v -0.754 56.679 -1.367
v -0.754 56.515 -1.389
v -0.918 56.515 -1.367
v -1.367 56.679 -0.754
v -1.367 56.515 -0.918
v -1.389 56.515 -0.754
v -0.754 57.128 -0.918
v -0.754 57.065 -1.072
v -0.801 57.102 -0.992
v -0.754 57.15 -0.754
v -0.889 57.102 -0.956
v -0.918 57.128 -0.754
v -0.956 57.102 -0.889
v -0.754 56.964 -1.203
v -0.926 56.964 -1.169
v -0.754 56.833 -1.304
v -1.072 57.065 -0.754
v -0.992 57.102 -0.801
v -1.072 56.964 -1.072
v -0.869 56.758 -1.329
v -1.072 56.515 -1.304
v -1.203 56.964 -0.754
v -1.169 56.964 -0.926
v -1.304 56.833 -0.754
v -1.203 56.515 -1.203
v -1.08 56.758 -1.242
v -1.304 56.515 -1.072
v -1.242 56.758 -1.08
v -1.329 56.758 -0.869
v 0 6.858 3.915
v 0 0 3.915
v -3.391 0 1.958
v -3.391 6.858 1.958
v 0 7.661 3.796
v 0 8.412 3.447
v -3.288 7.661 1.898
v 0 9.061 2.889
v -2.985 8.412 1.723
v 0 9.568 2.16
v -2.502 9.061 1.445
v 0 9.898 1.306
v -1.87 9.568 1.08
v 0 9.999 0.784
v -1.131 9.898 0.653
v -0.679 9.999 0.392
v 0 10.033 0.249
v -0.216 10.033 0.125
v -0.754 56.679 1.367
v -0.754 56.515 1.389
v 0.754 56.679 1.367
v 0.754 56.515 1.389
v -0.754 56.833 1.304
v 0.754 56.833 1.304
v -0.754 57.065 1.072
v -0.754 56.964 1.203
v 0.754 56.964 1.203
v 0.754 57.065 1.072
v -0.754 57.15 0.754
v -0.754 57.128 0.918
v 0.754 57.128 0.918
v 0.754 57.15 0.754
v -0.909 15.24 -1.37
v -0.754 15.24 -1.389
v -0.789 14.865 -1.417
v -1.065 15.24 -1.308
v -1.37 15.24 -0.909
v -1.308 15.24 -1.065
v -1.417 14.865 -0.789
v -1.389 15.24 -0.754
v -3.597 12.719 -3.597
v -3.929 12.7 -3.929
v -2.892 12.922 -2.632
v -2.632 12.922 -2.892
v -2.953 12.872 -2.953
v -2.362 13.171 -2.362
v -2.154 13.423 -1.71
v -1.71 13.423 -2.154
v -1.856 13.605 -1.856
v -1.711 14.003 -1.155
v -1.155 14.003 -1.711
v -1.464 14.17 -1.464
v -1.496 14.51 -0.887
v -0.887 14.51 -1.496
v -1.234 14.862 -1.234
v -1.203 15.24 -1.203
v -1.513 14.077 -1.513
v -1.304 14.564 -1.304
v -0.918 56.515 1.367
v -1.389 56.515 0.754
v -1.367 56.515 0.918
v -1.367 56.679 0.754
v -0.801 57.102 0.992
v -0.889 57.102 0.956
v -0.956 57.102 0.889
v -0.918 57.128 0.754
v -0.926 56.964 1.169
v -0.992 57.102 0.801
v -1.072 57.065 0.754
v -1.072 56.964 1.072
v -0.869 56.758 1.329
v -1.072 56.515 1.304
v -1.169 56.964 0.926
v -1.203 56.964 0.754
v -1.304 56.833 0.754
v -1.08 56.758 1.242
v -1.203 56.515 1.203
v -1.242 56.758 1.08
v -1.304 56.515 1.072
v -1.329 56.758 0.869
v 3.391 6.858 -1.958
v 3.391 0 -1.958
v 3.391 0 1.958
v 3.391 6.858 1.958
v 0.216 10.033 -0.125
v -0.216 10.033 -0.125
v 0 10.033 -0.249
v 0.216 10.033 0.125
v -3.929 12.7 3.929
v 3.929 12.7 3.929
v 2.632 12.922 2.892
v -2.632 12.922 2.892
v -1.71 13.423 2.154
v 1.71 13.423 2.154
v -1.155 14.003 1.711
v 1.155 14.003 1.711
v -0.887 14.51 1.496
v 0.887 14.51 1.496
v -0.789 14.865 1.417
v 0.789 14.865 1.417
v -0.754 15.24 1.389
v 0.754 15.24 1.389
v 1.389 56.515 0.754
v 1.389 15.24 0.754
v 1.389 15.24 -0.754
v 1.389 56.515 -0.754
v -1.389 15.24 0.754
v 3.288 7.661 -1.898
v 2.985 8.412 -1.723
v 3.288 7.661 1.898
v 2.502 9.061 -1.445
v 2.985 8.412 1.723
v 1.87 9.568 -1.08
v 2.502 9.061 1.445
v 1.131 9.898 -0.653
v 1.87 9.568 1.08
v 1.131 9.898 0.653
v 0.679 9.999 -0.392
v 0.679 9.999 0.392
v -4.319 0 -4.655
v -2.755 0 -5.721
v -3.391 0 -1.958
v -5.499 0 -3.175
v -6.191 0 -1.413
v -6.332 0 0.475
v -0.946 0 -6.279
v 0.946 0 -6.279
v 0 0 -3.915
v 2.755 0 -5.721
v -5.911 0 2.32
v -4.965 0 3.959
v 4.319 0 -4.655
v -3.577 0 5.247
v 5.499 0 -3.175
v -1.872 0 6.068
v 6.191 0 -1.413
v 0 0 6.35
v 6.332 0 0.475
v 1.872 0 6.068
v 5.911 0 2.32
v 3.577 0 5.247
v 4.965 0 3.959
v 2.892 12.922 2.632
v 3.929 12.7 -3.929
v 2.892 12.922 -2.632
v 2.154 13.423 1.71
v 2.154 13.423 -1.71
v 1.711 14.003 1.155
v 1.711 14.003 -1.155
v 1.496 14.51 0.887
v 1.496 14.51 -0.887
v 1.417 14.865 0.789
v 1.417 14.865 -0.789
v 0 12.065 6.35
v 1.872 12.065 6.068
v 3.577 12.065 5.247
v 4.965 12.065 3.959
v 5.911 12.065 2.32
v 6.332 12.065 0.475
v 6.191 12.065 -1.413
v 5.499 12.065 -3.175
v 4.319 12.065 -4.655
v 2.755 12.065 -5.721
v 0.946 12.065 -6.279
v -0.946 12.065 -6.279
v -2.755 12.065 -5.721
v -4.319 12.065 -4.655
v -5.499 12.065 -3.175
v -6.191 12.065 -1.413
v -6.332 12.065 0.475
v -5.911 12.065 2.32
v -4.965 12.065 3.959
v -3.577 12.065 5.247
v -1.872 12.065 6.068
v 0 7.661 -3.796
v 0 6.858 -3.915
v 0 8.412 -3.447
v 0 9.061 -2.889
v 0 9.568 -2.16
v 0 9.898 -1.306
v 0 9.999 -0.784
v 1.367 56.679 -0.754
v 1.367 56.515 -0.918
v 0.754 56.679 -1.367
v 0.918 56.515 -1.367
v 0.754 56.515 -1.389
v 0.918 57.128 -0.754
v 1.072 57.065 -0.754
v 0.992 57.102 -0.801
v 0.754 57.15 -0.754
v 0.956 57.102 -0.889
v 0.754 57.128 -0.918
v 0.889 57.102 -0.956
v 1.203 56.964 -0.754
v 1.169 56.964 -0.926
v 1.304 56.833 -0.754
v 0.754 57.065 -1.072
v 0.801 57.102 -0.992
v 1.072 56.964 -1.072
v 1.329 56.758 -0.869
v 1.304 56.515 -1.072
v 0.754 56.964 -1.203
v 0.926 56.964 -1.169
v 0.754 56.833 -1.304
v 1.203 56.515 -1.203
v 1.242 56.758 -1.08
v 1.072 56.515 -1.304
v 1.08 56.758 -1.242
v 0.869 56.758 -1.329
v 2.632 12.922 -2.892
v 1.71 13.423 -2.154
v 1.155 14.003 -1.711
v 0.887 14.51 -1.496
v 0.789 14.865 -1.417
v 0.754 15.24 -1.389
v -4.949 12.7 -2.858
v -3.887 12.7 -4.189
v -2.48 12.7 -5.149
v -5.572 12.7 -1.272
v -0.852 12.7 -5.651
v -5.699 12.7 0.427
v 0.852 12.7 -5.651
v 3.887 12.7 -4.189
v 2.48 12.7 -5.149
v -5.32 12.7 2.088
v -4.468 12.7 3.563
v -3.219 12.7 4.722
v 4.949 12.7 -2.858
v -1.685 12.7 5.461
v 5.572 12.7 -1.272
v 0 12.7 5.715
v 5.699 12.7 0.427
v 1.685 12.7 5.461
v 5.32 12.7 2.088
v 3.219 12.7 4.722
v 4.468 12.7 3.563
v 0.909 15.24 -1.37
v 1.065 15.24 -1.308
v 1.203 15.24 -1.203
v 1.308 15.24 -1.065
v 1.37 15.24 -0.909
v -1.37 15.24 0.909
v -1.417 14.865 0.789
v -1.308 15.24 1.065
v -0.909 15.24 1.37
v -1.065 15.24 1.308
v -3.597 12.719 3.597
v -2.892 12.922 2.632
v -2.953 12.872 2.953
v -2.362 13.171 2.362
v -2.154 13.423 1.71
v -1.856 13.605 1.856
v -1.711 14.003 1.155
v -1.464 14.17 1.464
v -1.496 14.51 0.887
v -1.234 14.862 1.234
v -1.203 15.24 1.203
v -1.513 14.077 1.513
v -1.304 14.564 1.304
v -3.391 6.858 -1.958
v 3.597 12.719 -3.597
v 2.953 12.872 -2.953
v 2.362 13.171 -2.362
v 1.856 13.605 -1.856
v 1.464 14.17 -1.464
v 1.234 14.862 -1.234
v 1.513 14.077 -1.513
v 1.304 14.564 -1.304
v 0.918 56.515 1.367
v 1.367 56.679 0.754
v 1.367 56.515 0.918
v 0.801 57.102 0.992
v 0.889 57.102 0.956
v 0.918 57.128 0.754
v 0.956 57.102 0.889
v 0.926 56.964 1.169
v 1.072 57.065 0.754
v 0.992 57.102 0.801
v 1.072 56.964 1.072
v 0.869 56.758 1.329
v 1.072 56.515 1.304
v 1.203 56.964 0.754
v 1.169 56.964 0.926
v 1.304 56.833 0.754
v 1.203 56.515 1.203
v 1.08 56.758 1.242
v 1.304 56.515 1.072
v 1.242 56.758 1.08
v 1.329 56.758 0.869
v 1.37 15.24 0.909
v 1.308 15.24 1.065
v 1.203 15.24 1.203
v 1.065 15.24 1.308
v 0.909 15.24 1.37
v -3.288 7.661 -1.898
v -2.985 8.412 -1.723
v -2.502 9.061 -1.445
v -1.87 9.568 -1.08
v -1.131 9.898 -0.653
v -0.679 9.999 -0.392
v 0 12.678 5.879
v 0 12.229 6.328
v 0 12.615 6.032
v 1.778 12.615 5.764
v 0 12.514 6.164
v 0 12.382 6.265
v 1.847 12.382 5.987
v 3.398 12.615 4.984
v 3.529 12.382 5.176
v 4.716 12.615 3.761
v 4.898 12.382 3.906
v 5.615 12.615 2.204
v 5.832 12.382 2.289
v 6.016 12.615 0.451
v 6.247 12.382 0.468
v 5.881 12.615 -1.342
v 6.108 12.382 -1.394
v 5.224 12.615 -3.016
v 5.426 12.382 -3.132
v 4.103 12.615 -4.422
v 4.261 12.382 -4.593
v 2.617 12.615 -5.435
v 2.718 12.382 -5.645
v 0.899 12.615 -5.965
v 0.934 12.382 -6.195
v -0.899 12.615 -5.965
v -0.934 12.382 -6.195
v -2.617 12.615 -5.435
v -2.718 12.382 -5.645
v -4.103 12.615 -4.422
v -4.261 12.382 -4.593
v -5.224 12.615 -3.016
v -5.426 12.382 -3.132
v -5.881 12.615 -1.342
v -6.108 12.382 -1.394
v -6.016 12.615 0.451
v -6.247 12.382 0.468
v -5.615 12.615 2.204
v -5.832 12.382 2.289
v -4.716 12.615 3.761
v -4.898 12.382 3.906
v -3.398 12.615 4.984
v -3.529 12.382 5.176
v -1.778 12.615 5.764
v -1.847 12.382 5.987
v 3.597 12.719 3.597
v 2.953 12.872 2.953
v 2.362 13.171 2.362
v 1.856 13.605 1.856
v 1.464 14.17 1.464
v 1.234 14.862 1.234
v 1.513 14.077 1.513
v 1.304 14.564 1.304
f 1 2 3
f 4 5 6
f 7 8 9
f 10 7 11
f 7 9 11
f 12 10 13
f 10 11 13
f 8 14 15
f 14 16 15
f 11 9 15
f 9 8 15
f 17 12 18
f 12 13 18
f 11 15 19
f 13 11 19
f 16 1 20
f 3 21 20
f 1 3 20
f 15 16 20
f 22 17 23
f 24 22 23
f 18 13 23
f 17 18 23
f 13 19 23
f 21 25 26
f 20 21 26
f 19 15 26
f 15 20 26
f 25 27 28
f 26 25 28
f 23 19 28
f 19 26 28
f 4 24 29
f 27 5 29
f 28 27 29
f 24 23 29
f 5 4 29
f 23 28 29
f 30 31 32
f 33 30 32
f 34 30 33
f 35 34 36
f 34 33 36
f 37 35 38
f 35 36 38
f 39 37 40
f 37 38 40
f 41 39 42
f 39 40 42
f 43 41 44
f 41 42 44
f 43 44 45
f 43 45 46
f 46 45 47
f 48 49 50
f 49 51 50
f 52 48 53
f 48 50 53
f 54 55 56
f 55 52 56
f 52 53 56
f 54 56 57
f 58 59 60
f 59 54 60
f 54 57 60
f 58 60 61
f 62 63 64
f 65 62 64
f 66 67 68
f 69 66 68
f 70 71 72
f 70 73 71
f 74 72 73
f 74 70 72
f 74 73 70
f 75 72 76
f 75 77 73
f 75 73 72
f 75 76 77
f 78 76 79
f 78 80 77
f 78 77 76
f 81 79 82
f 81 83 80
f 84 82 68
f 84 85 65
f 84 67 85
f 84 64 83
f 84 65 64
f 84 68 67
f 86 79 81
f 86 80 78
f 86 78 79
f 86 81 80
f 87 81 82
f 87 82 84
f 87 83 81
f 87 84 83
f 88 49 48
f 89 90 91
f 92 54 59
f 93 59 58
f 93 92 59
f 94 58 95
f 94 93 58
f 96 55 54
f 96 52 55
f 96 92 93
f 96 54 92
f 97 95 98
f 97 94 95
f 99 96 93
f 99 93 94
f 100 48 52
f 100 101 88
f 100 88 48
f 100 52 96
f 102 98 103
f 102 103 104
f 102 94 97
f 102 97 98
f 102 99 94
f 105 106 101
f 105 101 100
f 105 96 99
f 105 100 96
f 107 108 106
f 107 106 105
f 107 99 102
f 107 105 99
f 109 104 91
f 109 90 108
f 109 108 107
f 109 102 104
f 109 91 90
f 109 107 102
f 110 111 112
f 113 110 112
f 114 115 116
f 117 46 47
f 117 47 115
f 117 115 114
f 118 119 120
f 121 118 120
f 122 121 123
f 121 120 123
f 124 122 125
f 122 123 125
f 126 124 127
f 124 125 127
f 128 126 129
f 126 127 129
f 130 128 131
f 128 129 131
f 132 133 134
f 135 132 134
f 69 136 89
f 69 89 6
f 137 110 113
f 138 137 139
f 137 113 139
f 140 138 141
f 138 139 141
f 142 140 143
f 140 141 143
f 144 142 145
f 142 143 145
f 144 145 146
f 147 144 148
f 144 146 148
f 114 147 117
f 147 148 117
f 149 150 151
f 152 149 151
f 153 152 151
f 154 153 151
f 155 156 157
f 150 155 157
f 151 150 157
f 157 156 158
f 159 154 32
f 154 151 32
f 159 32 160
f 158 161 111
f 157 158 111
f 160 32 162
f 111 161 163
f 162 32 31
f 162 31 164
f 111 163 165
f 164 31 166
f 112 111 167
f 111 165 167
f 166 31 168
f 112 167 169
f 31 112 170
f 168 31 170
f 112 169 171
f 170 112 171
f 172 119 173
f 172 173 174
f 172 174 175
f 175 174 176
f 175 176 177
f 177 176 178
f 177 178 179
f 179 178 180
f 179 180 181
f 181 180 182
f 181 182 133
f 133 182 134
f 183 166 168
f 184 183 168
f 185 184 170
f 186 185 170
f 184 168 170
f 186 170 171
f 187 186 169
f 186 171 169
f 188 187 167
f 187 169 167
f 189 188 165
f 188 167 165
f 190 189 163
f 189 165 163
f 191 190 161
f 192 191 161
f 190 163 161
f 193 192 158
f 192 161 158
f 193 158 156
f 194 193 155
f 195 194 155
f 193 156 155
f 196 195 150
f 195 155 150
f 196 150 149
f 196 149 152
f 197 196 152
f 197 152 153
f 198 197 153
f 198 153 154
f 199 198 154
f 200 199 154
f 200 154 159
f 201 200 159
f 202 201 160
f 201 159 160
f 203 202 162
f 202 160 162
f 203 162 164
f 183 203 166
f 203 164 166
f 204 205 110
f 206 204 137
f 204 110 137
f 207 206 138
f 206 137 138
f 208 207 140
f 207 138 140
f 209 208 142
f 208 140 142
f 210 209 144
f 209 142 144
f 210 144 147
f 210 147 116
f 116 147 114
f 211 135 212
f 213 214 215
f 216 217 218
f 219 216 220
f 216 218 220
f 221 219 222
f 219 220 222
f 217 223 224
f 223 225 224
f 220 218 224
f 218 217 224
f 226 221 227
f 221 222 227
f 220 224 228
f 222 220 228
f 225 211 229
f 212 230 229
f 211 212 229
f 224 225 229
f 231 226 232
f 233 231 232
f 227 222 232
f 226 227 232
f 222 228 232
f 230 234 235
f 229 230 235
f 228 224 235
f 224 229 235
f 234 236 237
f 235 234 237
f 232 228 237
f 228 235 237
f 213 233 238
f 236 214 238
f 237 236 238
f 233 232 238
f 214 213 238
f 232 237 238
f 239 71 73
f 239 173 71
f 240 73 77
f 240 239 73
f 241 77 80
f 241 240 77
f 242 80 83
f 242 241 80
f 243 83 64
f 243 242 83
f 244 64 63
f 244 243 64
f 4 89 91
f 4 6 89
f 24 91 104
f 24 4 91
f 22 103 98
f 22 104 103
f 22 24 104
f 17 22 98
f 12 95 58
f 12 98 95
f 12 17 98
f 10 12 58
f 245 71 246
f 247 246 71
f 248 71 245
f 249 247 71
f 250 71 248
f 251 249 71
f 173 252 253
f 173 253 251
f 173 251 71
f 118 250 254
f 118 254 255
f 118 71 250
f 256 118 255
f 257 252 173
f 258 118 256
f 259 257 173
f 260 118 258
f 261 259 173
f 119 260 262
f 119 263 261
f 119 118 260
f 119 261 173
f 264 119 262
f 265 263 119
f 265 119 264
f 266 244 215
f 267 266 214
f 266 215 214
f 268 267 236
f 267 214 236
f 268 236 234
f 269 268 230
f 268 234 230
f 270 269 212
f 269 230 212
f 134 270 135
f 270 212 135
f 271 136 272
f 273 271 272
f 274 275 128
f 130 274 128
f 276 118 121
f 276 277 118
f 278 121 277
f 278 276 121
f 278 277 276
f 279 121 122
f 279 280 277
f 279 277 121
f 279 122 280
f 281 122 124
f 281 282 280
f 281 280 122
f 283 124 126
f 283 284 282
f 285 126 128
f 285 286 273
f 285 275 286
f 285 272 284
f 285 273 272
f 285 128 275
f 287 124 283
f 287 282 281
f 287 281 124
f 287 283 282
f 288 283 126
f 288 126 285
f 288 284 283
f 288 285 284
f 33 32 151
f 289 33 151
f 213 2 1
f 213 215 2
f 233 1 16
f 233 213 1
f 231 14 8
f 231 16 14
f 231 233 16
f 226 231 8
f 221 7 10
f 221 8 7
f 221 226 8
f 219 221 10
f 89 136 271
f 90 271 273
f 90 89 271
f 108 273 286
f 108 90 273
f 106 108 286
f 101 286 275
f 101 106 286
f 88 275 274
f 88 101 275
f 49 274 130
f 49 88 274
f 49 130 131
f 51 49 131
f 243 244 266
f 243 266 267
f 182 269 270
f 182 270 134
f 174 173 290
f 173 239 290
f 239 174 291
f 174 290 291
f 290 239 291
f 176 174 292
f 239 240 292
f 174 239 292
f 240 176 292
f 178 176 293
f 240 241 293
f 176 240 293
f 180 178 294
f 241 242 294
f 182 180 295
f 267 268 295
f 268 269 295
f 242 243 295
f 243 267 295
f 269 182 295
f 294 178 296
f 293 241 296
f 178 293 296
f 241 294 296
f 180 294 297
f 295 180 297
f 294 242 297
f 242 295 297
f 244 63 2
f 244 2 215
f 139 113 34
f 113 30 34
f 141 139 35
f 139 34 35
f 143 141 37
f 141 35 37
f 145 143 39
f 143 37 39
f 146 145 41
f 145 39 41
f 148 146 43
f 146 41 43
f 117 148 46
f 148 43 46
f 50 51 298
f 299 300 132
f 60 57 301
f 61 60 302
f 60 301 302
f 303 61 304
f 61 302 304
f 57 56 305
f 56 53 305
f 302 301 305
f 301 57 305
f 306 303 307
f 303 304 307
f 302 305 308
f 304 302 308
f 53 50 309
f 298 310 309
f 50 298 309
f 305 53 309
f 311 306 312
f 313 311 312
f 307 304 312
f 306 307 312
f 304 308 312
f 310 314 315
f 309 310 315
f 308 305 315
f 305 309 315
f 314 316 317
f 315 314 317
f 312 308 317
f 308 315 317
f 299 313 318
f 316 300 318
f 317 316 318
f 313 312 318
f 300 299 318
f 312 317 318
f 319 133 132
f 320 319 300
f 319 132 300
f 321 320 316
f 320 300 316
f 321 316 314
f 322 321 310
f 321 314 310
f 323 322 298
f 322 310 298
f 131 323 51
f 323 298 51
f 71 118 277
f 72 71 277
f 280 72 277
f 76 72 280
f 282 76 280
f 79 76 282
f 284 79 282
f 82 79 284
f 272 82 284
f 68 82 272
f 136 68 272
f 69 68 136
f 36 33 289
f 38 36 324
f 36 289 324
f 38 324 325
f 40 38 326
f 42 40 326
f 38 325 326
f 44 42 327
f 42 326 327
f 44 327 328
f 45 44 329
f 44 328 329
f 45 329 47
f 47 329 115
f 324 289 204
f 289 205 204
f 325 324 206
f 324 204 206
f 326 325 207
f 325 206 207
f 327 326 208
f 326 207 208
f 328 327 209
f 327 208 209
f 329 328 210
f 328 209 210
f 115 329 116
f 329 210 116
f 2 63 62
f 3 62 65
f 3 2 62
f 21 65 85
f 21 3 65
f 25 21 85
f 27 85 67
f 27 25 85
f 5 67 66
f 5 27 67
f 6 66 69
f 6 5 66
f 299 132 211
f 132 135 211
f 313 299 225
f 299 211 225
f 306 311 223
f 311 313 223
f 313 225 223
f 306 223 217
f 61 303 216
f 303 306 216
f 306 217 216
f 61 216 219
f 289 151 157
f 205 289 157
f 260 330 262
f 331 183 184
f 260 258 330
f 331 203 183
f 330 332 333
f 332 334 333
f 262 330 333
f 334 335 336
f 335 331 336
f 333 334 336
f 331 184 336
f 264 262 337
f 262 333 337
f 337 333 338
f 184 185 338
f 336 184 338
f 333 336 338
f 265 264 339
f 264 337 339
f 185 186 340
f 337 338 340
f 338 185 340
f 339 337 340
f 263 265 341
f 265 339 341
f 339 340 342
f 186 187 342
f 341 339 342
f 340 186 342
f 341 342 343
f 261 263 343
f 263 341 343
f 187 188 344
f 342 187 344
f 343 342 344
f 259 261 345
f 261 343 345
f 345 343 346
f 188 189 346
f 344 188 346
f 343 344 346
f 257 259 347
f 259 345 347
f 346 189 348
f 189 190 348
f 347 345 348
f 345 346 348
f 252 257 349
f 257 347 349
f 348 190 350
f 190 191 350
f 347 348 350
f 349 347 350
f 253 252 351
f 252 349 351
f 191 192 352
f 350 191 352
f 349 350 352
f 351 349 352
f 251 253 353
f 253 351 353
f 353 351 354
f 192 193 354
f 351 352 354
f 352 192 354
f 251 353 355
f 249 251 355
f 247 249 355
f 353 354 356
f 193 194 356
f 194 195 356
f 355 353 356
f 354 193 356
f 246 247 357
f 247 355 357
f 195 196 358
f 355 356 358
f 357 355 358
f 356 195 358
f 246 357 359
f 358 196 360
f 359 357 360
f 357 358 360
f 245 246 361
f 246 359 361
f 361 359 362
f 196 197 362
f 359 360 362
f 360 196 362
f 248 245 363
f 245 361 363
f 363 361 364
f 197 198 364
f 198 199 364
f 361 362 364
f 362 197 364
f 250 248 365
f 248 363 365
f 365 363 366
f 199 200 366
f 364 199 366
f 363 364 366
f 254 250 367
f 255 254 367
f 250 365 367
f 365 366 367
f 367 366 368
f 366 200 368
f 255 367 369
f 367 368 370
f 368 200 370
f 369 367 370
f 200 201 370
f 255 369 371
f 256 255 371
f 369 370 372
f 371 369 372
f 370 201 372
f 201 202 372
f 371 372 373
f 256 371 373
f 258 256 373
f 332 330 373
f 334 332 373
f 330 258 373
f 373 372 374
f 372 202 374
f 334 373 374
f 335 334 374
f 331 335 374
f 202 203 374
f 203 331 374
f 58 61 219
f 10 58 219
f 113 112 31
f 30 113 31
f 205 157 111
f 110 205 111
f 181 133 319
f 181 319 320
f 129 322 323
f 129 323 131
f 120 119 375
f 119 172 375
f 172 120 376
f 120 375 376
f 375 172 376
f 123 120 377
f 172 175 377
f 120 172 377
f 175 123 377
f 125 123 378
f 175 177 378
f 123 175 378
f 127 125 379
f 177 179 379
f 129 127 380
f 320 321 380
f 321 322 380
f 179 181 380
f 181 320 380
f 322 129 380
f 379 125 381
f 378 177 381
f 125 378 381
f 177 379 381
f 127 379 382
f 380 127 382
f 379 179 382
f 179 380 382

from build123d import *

# Parameters (mm, degrees)
SKETCH1_R           = 6.35
BOSS_EXTRUDE1_DEPTH = 12.7
SKETCH2_W           = 2.778125
SKETCH2_H           = 2.778125
BOSS_EXTRUDE2_DEPTH = 44.45
FILLET1_R           = 2.54
FILLET2_R           = 0.635
CUT_EXTRUDE1_DEPTH  = 10.033
FILLET3_R           = 3.175


with BuildPart() as part:
    # Sketch1 → Boss-Extrude1 (new body)
    with BuildSketch(Plane(origin=(0, 0, 0), x_dir=(0, 0, -1), z_dir=(0, 1, 0))):
        Circle(SKETCH1_R)
    extrude(amount=BOSS_EXTRUDE1_DEPTH)

    # Sketch2 → Boss-Extrude2 (add)
    with BuildSketch(Plane(origin=(-12.7, 12.7, 0), x_dir=(0, 0, -1), z_dir=(0, -1, 0))):
        with Locations((0, 12.7)):
            Rectangle(SKETCH2_W, SKETCH2_H)
    extrude(amount=-BOSS_EXTRUDE2_DEPTH)

    # Fillet1
    fillet1_edges = [part.edges().sort_by_distance(p)[0] for p in [
        (0, 12.7, 1.3890625),
        (-1.3890625, 12.7, 0),
        (0, 12.7, -1.3890625),
        (1.3890625, 12.7, 0),
    ]]
    fillet(fillet1_edges, radius=FILLET1_R)

    # Fillet2
    fillet2_edges = [part.edges().sort_by_distance(p)[0] for p in [
        (2.288098215, 13.301228168, 2.288098215),
        (-2.288098198, 13.301228182, 2.288098198),
        (2.288098275, 13.301228117, -2.288098275),
        (-2.288098218, 13.301228166, -2.288098218),
        (1.3890625, 36.195, 1.3890625),
        (-1.3890625, 36.195, 1.3890625),
        (1.3890625, 36.195, -1.3890625),
        (-1.3890625, 36.195, -1.3890625),
        (0, 12.7, 6.35),
        (0, 57.15, -1.3890625),
        (1.3890625, 57.15, 0),
        (0, 57.15, 1.3890625),
        (-1.3890625, 57.15, 0),
    ]]
    fillet(fillet2_edges, radius=FILLET2_R)

    # Sketch3 → Cut-Extrude1 (cut)
    with BuildSketch(Plane.XZ):
        Polygon((-3.3909, 1.957737028), (-3.3909, -1.957737028), (0, -3.915474056), (3.3909, -1.957737028), (3.3909, 1.957737028), (0, 3.915474056), align=None)
    extrude(amount=-CUT_EXTRUDE1_DEPTH, mode=Mode.SUBTRACT)

    # Fillet3
    fillet3_edges = [part.edges().sort_by_distance(p)[0] for p in [
        (1.69545, 10.033, 2.936605542),
        (3.3909, 10.033, 0),
        (1.69545, 10.033, -2.936605542),
        (-1.69545, 10.033, -2.936605542),
        (-3.3909, 10.033, 0),
        (-1.69545, 10.033, 2.936605542),
    ]]
    fillet(fillet3_edges, radius=FILLET3_R)


solid = part.part
